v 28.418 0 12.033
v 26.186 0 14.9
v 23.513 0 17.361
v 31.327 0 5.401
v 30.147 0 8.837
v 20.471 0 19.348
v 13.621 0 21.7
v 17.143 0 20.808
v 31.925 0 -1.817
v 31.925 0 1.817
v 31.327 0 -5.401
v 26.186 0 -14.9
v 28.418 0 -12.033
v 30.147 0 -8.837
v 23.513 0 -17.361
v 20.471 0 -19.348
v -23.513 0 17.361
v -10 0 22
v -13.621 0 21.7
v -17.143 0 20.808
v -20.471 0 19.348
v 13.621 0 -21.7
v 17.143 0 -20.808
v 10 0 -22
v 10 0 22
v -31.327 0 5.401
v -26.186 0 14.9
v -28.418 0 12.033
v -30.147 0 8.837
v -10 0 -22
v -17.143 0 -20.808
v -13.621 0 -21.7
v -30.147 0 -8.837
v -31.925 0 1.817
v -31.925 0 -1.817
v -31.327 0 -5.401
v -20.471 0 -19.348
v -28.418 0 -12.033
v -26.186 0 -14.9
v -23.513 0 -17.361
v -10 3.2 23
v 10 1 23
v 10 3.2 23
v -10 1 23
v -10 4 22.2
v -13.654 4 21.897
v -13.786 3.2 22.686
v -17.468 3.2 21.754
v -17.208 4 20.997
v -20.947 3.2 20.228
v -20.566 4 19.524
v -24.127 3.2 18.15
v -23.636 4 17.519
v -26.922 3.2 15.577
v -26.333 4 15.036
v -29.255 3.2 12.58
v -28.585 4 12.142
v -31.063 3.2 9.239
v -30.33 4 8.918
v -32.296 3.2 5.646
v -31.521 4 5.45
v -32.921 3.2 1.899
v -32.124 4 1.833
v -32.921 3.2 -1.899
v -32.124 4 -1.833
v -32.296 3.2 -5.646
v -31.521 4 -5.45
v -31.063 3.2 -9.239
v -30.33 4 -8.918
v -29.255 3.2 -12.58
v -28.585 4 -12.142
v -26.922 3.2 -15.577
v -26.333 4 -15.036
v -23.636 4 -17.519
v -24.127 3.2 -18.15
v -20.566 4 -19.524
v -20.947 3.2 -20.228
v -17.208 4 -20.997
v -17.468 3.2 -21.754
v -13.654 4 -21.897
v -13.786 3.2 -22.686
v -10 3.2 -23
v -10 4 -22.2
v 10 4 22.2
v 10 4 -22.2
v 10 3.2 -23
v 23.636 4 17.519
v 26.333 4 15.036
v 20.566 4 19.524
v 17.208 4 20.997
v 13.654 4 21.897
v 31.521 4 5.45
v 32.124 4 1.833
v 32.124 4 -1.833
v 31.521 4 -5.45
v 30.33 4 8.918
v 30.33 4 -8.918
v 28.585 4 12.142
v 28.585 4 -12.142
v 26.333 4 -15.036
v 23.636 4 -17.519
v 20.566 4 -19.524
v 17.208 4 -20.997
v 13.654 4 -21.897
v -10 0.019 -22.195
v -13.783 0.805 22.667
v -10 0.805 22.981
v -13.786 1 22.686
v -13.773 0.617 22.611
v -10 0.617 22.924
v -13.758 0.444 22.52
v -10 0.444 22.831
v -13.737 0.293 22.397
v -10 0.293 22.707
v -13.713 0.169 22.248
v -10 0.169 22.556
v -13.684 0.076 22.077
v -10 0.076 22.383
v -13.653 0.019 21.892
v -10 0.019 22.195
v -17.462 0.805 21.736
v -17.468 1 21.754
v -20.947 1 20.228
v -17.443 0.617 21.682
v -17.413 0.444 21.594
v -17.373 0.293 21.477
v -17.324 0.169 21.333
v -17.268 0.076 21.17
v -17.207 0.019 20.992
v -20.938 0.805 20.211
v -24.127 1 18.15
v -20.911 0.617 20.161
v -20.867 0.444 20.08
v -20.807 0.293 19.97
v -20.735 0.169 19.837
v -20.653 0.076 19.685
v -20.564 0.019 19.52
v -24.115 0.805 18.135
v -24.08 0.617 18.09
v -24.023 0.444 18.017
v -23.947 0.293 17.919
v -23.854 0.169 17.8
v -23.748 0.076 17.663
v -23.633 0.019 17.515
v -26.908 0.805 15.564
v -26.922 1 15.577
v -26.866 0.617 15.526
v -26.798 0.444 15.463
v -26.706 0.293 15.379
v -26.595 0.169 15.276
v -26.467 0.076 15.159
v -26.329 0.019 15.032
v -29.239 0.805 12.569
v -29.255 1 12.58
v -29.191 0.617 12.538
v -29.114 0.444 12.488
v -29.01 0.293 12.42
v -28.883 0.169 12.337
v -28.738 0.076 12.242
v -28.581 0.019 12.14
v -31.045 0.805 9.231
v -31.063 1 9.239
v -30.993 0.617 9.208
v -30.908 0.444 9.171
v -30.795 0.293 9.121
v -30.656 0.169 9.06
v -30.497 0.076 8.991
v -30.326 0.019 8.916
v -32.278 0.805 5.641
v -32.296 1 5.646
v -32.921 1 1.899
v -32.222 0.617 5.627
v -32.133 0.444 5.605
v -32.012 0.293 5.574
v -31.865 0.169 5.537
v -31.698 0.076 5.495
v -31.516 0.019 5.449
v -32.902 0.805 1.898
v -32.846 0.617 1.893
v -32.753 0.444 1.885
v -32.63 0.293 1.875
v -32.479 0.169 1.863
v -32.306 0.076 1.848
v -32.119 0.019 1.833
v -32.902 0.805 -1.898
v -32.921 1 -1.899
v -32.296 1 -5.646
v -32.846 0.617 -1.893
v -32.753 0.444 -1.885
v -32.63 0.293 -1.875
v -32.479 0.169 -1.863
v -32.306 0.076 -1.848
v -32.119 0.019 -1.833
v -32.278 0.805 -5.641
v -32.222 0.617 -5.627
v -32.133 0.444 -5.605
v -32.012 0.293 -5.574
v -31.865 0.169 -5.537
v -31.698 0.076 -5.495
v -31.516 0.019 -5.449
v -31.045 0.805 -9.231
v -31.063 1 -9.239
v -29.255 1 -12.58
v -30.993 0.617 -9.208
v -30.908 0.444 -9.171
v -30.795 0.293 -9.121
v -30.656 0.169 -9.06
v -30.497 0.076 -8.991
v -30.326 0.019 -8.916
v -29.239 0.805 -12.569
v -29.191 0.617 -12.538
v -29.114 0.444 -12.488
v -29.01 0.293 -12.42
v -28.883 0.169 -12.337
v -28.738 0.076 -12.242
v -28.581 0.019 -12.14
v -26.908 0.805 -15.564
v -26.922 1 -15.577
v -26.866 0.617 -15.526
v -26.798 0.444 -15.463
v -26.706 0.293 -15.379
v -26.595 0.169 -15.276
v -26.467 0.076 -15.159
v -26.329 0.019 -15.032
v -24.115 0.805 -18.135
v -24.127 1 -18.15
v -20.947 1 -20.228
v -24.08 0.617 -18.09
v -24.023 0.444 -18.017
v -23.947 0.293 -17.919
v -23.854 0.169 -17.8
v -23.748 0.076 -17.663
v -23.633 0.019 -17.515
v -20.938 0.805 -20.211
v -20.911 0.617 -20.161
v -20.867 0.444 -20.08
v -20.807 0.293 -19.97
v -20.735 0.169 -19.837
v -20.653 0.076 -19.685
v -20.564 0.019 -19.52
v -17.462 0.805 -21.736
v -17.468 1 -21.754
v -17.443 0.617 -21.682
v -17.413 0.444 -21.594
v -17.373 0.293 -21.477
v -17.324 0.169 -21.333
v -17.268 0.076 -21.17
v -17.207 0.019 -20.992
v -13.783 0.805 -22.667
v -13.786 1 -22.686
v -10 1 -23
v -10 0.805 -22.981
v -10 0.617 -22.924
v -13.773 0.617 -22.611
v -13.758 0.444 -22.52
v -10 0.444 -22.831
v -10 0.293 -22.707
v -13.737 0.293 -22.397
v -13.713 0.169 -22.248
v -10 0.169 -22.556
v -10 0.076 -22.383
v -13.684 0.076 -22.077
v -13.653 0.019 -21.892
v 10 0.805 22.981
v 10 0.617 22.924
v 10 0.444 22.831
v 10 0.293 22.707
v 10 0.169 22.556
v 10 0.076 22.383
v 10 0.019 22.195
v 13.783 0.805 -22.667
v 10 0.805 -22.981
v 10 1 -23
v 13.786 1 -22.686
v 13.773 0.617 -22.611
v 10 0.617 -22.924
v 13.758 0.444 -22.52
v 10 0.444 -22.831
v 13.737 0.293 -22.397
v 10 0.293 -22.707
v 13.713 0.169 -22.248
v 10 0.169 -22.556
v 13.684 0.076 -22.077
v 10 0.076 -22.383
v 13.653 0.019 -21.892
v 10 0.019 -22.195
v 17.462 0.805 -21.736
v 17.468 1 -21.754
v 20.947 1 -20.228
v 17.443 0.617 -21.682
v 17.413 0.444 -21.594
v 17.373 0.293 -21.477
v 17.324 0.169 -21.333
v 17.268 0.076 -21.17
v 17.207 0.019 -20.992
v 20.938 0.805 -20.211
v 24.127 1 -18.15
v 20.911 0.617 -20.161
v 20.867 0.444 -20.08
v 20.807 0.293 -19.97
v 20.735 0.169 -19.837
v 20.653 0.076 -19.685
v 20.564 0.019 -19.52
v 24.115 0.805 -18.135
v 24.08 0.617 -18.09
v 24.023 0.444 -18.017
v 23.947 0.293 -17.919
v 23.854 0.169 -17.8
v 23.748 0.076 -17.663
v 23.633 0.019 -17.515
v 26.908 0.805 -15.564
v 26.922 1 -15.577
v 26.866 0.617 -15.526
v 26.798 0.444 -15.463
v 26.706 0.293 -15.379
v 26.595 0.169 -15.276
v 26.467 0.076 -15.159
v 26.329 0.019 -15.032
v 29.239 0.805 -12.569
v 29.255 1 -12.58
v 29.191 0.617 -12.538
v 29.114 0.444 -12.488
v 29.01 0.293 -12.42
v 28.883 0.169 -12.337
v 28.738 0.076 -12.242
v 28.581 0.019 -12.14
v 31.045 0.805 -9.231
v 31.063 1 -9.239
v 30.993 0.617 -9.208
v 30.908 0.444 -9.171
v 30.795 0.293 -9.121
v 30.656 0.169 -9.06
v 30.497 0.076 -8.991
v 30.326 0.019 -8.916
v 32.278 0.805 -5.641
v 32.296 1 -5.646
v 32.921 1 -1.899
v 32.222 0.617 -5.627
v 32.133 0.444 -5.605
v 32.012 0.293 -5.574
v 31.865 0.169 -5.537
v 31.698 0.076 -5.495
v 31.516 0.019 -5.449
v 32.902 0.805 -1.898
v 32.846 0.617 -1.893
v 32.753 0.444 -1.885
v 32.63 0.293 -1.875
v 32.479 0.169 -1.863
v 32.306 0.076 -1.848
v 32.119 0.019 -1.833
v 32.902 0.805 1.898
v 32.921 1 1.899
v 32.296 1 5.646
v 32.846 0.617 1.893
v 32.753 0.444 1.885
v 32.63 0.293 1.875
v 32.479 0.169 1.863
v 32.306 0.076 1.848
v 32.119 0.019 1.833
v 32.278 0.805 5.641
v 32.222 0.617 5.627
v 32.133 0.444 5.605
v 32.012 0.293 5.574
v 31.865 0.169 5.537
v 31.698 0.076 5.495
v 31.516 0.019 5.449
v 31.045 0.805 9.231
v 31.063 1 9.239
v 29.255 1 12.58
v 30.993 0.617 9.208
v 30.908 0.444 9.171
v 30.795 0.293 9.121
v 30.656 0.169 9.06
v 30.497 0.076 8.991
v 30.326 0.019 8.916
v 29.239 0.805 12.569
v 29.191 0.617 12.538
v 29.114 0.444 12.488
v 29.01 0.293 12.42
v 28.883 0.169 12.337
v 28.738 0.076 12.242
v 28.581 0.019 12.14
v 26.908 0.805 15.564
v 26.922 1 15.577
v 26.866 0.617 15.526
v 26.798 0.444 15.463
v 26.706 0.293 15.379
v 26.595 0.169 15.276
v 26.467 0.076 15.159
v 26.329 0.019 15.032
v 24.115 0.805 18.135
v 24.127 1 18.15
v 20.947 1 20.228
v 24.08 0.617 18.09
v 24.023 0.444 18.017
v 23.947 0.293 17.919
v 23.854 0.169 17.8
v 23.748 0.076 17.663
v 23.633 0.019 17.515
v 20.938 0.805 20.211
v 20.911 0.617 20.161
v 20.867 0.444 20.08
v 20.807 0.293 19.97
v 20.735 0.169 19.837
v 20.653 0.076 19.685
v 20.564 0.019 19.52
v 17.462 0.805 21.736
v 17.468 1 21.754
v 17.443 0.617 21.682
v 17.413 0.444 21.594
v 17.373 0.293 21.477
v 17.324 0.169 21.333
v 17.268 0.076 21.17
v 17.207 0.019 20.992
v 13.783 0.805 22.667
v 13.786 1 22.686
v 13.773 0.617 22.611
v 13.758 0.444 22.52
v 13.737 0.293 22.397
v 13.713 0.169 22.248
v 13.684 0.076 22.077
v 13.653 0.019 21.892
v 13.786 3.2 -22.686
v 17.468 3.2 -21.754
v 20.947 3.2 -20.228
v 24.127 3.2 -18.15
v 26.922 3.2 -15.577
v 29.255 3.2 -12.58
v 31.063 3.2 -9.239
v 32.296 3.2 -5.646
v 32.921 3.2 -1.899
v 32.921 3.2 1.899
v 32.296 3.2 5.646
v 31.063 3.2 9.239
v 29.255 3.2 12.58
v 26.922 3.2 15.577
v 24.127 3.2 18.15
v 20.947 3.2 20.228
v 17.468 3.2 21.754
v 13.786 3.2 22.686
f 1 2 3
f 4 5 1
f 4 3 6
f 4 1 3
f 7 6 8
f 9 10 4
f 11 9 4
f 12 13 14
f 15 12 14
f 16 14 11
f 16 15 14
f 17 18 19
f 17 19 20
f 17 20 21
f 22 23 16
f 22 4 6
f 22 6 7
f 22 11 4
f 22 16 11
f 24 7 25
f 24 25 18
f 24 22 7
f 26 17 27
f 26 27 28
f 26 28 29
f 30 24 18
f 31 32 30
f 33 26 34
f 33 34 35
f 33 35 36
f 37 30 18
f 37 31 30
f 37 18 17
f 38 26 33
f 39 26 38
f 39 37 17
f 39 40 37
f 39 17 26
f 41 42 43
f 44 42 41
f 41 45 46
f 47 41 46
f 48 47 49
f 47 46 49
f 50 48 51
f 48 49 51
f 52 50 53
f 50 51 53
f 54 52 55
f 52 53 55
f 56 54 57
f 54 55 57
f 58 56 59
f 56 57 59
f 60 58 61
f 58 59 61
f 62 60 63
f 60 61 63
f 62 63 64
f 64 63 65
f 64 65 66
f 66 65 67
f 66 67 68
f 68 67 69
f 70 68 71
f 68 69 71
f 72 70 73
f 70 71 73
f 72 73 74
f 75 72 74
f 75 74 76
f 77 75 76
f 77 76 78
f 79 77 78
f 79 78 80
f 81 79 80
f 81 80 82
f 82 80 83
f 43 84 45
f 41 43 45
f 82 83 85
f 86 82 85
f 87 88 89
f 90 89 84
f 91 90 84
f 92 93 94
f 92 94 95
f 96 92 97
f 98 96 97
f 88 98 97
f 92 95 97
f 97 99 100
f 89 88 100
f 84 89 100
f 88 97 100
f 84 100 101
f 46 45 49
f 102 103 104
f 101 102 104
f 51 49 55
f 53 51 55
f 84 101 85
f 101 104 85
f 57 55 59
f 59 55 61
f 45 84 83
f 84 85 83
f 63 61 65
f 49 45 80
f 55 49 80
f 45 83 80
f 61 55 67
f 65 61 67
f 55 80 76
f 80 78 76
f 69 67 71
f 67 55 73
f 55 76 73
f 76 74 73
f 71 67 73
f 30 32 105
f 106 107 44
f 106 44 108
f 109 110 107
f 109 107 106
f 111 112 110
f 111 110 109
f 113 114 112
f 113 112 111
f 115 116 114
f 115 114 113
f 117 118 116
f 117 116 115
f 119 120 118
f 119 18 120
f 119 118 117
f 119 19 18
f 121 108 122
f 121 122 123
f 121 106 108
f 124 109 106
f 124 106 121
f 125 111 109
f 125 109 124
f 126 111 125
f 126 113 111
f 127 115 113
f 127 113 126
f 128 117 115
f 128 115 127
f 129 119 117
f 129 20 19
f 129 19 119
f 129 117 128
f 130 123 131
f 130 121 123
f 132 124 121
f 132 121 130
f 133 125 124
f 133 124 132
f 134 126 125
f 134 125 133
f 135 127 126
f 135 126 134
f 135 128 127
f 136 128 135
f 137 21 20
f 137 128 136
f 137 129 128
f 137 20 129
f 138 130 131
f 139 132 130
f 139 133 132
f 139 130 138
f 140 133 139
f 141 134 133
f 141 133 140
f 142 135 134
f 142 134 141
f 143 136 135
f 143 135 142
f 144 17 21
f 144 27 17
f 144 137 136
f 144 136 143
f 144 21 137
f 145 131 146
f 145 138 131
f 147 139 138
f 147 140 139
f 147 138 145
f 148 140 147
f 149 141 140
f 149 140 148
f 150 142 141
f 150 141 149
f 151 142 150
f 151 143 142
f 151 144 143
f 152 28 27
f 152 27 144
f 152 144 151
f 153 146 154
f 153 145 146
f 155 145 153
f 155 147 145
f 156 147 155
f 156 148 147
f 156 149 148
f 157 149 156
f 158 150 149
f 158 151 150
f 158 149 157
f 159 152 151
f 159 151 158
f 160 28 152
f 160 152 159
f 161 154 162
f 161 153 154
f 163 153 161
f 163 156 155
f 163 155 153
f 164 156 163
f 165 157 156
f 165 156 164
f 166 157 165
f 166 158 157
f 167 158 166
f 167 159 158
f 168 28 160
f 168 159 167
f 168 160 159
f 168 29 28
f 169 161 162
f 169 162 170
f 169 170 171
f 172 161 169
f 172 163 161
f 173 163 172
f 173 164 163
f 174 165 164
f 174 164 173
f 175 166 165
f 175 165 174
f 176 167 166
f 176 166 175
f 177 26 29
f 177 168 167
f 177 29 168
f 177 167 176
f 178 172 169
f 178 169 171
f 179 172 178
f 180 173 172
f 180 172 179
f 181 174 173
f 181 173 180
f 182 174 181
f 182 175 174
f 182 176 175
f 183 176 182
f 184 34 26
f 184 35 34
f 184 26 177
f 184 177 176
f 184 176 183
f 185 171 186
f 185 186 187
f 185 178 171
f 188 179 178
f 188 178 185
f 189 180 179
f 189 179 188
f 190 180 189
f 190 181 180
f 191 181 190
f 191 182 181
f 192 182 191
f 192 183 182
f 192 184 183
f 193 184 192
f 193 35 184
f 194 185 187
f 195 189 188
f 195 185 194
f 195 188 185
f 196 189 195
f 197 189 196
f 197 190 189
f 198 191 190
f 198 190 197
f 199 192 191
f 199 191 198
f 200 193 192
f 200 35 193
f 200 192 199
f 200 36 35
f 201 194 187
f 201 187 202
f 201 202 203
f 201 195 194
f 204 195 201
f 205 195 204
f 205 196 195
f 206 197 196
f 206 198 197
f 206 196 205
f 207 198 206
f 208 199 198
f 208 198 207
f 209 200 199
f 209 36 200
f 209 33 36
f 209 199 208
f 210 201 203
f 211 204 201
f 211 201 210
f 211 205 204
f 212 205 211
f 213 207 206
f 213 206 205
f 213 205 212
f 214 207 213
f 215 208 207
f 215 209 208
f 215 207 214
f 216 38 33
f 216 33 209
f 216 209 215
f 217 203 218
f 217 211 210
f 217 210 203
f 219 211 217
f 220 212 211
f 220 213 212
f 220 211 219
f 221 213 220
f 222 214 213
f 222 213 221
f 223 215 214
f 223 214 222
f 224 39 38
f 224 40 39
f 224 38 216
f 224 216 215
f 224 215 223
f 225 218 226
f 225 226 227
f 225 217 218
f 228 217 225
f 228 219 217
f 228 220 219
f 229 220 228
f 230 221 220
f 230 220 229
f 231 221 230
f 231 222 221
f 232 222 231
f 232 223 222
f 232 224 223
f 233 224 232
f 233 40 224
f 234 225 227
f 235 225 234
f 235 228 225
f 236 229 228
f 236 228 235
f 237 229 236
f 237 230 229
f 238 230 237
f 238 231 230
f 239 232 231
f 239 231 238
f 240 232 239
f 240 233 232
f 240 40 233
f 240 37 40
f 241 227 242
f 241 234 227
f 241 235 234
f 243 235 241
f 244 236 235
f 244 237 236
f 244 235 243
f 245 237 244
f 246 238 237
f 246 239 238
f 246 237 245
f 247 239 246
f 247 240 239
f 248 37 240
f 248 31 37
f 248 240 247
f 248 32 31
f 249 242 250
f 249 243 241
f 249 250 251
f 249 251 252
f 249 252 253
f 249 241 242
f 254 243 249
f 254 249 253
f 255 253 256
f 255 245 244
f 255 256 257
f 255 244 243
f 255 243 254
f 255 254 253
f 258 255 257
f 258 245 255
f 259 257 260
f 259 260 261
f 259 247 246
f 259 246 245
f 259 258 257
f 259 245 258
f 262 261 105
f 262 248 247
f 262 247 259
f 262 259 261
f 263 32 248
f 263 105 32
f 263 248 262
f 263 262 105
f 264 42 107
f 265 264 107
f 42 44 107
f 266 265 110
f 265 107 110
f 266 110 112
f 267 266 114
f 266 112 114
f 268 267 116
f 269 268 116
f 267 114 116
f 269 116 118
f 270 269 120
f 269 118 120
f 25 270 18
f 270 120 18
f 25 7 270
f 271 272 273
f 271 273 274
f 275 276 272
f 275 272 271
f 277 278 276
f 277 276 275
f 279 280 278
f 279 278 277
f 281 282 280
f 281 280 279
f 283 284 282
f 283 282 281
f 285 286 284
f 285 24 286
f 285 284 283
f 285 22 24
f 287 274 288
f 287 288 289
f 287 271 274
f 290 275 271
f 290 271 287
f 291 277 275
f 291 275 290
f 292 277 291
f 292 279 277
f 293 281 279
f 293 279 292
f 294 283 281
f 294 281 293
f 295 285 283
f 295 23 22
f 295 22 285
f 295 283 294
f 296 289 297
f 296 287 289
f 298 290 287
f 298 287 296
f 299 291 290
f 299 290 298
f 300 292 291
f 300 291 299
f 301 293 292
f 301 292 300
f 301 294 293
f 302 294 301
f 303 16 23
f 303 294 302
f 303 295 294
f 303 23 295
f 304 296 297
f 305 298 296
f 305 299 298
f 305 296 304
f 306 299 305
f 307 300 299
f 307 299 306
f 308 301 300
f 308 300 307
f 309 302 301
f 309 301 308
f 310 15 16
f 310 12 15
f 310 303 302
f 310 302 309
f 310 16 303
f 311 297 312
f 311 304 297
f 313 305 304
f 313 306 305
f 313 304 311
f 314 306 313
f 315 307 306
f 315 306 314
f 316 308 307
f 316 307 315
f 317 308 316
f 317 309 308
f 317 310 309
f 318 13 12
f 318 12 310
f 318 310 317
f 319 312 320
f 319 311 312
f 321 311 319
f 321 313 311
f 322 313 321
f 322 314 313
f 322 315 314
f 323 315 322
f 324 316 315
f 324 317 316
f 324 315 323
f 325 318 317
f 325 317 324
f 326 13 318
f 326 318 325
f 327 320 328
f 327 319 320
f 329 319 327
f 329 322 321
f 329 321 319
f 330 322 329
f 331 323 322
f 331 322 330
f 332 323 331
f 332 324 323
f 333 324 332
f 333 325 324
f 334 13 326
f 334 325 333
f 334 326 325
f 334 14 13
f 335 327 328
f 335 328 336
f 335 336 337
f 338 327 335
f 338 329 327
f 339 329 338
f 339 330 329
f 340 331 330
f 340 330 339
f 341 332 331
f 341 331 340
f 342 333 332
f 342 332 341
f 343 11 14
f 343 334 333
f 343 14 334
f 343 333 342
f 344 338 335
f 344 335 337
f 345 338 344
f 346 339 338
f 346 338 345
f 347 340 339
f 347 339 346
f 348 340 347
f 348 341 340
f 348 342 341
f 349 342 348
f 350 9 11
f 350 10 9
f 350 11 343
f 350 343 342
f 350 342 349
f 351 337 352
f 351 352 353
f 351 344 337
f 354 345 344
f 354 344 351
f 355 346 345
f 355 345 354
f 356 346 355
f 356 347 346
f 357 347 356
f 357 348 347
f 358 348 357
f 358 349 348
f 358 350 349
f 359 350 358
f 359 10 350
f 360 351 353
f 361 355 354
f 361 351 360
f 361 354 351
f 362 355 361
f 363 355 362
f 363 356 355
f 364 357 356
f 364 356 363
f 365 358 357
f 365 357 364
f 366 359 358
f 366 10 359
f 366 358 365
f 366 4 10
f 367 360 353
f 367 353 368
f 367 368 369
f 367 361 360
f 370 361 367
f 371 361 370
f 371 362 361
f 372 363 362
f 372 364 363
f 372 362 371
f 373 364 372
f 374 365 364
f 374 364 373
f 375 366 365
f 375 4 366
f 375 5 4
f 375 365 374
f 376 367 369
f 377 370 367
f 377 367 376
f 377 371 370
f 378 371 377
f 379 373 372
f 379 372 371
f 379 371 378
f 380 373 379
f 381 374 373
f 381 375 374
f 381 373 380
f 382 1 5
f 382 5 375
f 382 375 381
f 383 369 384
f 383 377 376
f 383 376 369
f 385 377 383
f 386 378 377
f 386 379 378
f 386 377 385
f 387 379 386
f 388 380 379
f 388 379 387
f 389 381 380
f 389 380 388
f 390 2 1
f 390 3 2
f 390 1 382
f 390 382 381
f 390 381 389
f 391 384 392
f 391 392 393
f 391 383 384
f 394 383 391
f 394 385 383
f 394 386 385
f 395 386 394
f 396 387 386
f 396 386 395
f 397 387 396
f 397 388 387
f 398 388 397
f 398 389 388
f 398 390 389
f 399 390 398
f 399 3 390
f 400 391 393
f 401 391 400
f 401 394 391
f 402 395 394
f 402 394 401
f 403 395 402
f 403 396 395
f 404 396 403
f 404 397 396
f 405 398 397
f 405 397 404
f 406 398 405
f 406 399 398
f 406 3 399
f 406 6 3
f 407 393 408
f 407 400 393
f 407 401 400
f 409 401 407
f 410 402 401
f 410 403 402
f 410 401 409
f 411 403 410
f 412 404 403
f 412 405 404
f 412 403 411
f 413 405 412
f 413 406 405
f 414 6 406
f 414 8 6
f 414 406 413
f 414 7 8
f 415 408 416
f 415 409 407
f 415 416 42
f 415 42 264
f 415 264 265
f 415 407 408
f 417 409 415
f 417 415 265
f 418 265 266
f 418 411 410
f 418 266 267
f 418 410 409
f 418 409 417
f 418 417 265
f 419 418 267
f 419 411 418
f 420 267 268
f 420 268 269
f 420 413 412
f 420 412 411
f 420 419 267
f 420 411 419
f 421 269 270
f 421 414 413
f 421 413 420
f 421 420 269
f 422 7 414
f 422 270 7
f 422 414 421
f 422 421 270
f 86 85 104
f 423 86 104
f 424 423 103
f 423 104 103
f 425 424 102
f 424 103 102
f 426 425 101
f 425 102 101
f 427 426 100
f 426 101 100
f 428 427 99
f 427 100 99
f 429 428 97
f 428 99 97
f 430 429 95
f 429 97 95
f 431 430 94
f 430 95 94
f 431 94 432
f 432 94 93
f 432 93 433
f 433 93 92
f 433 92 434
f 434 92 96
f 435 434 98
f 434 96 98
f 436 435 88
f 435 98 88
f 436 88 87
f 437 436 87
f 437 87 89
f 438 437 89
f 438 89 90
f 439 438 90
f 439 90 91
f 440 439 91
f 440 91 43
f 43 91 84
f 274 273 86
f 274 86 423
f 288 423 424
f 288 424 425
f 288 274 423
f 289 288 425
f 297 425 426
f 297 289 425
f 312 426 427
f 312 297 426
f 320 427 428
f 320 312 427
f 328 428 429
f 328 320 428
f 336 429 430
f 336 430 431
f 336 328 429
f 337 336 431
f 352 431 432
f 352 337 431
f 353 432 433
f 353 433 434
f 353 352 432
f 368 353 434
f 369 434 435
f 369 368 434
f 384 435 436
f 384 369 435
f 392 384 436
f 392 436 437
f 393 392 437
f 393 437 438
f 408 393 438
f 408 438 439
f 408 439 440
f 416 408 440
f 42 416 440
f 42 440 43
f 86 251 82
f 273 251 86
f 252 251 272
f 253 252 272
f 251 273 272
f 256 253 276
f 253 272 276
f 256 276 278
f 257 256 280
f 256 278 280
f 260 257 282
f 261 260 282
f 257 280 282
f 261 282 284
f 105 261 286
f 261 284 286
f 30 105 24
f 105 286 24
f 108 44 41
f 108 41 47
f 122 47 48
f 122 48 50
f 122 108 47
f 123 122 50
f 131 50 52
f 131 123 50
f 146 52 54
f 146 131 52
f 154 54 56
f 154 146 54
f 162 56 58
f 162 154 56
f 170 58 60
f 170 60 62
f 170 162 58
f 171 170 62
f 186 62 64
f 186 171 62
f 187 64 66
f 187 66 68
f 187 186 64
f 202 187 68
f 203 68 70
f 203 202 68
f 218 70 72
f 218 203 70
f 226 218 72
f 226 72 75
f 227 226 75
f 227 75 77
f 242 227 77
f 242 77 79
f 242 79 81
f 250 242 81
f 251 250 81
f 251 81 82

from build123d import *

# Parameters (mm, degrees)
BOSS_EXTRUDE1_DEPTH = 4
CHAMFER1_SIZE       = 0.8
FILLET1_R           = 1


with BuildPart() as part:
    # Sketch1 → Boss-Extrude1 (new body)
    with BuildSketch(Plane(origin=(0, 0, 0), x_dir=(1, 0, 0), z_dir=(0, 1, 0))):
        with BuildLine():
            Line((-10, 23), (10, 23))
            ThreePointArc((10, 23), (33, 0), (10, -23))
            Line((10, -23), (-10, -23))
            ThreePointArc((-10, -23), (-33, 0), (-10, 23))
        make_face()
    extrude(amount=BOSS_EXTRUDE1_DEPTH)

    # Chamfer1
    chamfer1_edges = [part.edges().sort_by_distance(p)[0] for p in [
        (33, 4, 0),
        (0, 4, -23),
        (-33, 4, 0),
        (0, 4, 23),
    ]]
    chamfer(chamfer1_edges, length=CHAMFER1_SIZE)

    # Fillet1
    fillet1_edges = [part.edges().sort_by_distance(p)[0] for p in [
        (0, 0, -23),
        (33, 0, 0),
        (0, 0, 23),
        (-33, 0, 0),
    ]]
    fillet(fillet1_edges, radius=FILLET1_R)


solid = part.part
